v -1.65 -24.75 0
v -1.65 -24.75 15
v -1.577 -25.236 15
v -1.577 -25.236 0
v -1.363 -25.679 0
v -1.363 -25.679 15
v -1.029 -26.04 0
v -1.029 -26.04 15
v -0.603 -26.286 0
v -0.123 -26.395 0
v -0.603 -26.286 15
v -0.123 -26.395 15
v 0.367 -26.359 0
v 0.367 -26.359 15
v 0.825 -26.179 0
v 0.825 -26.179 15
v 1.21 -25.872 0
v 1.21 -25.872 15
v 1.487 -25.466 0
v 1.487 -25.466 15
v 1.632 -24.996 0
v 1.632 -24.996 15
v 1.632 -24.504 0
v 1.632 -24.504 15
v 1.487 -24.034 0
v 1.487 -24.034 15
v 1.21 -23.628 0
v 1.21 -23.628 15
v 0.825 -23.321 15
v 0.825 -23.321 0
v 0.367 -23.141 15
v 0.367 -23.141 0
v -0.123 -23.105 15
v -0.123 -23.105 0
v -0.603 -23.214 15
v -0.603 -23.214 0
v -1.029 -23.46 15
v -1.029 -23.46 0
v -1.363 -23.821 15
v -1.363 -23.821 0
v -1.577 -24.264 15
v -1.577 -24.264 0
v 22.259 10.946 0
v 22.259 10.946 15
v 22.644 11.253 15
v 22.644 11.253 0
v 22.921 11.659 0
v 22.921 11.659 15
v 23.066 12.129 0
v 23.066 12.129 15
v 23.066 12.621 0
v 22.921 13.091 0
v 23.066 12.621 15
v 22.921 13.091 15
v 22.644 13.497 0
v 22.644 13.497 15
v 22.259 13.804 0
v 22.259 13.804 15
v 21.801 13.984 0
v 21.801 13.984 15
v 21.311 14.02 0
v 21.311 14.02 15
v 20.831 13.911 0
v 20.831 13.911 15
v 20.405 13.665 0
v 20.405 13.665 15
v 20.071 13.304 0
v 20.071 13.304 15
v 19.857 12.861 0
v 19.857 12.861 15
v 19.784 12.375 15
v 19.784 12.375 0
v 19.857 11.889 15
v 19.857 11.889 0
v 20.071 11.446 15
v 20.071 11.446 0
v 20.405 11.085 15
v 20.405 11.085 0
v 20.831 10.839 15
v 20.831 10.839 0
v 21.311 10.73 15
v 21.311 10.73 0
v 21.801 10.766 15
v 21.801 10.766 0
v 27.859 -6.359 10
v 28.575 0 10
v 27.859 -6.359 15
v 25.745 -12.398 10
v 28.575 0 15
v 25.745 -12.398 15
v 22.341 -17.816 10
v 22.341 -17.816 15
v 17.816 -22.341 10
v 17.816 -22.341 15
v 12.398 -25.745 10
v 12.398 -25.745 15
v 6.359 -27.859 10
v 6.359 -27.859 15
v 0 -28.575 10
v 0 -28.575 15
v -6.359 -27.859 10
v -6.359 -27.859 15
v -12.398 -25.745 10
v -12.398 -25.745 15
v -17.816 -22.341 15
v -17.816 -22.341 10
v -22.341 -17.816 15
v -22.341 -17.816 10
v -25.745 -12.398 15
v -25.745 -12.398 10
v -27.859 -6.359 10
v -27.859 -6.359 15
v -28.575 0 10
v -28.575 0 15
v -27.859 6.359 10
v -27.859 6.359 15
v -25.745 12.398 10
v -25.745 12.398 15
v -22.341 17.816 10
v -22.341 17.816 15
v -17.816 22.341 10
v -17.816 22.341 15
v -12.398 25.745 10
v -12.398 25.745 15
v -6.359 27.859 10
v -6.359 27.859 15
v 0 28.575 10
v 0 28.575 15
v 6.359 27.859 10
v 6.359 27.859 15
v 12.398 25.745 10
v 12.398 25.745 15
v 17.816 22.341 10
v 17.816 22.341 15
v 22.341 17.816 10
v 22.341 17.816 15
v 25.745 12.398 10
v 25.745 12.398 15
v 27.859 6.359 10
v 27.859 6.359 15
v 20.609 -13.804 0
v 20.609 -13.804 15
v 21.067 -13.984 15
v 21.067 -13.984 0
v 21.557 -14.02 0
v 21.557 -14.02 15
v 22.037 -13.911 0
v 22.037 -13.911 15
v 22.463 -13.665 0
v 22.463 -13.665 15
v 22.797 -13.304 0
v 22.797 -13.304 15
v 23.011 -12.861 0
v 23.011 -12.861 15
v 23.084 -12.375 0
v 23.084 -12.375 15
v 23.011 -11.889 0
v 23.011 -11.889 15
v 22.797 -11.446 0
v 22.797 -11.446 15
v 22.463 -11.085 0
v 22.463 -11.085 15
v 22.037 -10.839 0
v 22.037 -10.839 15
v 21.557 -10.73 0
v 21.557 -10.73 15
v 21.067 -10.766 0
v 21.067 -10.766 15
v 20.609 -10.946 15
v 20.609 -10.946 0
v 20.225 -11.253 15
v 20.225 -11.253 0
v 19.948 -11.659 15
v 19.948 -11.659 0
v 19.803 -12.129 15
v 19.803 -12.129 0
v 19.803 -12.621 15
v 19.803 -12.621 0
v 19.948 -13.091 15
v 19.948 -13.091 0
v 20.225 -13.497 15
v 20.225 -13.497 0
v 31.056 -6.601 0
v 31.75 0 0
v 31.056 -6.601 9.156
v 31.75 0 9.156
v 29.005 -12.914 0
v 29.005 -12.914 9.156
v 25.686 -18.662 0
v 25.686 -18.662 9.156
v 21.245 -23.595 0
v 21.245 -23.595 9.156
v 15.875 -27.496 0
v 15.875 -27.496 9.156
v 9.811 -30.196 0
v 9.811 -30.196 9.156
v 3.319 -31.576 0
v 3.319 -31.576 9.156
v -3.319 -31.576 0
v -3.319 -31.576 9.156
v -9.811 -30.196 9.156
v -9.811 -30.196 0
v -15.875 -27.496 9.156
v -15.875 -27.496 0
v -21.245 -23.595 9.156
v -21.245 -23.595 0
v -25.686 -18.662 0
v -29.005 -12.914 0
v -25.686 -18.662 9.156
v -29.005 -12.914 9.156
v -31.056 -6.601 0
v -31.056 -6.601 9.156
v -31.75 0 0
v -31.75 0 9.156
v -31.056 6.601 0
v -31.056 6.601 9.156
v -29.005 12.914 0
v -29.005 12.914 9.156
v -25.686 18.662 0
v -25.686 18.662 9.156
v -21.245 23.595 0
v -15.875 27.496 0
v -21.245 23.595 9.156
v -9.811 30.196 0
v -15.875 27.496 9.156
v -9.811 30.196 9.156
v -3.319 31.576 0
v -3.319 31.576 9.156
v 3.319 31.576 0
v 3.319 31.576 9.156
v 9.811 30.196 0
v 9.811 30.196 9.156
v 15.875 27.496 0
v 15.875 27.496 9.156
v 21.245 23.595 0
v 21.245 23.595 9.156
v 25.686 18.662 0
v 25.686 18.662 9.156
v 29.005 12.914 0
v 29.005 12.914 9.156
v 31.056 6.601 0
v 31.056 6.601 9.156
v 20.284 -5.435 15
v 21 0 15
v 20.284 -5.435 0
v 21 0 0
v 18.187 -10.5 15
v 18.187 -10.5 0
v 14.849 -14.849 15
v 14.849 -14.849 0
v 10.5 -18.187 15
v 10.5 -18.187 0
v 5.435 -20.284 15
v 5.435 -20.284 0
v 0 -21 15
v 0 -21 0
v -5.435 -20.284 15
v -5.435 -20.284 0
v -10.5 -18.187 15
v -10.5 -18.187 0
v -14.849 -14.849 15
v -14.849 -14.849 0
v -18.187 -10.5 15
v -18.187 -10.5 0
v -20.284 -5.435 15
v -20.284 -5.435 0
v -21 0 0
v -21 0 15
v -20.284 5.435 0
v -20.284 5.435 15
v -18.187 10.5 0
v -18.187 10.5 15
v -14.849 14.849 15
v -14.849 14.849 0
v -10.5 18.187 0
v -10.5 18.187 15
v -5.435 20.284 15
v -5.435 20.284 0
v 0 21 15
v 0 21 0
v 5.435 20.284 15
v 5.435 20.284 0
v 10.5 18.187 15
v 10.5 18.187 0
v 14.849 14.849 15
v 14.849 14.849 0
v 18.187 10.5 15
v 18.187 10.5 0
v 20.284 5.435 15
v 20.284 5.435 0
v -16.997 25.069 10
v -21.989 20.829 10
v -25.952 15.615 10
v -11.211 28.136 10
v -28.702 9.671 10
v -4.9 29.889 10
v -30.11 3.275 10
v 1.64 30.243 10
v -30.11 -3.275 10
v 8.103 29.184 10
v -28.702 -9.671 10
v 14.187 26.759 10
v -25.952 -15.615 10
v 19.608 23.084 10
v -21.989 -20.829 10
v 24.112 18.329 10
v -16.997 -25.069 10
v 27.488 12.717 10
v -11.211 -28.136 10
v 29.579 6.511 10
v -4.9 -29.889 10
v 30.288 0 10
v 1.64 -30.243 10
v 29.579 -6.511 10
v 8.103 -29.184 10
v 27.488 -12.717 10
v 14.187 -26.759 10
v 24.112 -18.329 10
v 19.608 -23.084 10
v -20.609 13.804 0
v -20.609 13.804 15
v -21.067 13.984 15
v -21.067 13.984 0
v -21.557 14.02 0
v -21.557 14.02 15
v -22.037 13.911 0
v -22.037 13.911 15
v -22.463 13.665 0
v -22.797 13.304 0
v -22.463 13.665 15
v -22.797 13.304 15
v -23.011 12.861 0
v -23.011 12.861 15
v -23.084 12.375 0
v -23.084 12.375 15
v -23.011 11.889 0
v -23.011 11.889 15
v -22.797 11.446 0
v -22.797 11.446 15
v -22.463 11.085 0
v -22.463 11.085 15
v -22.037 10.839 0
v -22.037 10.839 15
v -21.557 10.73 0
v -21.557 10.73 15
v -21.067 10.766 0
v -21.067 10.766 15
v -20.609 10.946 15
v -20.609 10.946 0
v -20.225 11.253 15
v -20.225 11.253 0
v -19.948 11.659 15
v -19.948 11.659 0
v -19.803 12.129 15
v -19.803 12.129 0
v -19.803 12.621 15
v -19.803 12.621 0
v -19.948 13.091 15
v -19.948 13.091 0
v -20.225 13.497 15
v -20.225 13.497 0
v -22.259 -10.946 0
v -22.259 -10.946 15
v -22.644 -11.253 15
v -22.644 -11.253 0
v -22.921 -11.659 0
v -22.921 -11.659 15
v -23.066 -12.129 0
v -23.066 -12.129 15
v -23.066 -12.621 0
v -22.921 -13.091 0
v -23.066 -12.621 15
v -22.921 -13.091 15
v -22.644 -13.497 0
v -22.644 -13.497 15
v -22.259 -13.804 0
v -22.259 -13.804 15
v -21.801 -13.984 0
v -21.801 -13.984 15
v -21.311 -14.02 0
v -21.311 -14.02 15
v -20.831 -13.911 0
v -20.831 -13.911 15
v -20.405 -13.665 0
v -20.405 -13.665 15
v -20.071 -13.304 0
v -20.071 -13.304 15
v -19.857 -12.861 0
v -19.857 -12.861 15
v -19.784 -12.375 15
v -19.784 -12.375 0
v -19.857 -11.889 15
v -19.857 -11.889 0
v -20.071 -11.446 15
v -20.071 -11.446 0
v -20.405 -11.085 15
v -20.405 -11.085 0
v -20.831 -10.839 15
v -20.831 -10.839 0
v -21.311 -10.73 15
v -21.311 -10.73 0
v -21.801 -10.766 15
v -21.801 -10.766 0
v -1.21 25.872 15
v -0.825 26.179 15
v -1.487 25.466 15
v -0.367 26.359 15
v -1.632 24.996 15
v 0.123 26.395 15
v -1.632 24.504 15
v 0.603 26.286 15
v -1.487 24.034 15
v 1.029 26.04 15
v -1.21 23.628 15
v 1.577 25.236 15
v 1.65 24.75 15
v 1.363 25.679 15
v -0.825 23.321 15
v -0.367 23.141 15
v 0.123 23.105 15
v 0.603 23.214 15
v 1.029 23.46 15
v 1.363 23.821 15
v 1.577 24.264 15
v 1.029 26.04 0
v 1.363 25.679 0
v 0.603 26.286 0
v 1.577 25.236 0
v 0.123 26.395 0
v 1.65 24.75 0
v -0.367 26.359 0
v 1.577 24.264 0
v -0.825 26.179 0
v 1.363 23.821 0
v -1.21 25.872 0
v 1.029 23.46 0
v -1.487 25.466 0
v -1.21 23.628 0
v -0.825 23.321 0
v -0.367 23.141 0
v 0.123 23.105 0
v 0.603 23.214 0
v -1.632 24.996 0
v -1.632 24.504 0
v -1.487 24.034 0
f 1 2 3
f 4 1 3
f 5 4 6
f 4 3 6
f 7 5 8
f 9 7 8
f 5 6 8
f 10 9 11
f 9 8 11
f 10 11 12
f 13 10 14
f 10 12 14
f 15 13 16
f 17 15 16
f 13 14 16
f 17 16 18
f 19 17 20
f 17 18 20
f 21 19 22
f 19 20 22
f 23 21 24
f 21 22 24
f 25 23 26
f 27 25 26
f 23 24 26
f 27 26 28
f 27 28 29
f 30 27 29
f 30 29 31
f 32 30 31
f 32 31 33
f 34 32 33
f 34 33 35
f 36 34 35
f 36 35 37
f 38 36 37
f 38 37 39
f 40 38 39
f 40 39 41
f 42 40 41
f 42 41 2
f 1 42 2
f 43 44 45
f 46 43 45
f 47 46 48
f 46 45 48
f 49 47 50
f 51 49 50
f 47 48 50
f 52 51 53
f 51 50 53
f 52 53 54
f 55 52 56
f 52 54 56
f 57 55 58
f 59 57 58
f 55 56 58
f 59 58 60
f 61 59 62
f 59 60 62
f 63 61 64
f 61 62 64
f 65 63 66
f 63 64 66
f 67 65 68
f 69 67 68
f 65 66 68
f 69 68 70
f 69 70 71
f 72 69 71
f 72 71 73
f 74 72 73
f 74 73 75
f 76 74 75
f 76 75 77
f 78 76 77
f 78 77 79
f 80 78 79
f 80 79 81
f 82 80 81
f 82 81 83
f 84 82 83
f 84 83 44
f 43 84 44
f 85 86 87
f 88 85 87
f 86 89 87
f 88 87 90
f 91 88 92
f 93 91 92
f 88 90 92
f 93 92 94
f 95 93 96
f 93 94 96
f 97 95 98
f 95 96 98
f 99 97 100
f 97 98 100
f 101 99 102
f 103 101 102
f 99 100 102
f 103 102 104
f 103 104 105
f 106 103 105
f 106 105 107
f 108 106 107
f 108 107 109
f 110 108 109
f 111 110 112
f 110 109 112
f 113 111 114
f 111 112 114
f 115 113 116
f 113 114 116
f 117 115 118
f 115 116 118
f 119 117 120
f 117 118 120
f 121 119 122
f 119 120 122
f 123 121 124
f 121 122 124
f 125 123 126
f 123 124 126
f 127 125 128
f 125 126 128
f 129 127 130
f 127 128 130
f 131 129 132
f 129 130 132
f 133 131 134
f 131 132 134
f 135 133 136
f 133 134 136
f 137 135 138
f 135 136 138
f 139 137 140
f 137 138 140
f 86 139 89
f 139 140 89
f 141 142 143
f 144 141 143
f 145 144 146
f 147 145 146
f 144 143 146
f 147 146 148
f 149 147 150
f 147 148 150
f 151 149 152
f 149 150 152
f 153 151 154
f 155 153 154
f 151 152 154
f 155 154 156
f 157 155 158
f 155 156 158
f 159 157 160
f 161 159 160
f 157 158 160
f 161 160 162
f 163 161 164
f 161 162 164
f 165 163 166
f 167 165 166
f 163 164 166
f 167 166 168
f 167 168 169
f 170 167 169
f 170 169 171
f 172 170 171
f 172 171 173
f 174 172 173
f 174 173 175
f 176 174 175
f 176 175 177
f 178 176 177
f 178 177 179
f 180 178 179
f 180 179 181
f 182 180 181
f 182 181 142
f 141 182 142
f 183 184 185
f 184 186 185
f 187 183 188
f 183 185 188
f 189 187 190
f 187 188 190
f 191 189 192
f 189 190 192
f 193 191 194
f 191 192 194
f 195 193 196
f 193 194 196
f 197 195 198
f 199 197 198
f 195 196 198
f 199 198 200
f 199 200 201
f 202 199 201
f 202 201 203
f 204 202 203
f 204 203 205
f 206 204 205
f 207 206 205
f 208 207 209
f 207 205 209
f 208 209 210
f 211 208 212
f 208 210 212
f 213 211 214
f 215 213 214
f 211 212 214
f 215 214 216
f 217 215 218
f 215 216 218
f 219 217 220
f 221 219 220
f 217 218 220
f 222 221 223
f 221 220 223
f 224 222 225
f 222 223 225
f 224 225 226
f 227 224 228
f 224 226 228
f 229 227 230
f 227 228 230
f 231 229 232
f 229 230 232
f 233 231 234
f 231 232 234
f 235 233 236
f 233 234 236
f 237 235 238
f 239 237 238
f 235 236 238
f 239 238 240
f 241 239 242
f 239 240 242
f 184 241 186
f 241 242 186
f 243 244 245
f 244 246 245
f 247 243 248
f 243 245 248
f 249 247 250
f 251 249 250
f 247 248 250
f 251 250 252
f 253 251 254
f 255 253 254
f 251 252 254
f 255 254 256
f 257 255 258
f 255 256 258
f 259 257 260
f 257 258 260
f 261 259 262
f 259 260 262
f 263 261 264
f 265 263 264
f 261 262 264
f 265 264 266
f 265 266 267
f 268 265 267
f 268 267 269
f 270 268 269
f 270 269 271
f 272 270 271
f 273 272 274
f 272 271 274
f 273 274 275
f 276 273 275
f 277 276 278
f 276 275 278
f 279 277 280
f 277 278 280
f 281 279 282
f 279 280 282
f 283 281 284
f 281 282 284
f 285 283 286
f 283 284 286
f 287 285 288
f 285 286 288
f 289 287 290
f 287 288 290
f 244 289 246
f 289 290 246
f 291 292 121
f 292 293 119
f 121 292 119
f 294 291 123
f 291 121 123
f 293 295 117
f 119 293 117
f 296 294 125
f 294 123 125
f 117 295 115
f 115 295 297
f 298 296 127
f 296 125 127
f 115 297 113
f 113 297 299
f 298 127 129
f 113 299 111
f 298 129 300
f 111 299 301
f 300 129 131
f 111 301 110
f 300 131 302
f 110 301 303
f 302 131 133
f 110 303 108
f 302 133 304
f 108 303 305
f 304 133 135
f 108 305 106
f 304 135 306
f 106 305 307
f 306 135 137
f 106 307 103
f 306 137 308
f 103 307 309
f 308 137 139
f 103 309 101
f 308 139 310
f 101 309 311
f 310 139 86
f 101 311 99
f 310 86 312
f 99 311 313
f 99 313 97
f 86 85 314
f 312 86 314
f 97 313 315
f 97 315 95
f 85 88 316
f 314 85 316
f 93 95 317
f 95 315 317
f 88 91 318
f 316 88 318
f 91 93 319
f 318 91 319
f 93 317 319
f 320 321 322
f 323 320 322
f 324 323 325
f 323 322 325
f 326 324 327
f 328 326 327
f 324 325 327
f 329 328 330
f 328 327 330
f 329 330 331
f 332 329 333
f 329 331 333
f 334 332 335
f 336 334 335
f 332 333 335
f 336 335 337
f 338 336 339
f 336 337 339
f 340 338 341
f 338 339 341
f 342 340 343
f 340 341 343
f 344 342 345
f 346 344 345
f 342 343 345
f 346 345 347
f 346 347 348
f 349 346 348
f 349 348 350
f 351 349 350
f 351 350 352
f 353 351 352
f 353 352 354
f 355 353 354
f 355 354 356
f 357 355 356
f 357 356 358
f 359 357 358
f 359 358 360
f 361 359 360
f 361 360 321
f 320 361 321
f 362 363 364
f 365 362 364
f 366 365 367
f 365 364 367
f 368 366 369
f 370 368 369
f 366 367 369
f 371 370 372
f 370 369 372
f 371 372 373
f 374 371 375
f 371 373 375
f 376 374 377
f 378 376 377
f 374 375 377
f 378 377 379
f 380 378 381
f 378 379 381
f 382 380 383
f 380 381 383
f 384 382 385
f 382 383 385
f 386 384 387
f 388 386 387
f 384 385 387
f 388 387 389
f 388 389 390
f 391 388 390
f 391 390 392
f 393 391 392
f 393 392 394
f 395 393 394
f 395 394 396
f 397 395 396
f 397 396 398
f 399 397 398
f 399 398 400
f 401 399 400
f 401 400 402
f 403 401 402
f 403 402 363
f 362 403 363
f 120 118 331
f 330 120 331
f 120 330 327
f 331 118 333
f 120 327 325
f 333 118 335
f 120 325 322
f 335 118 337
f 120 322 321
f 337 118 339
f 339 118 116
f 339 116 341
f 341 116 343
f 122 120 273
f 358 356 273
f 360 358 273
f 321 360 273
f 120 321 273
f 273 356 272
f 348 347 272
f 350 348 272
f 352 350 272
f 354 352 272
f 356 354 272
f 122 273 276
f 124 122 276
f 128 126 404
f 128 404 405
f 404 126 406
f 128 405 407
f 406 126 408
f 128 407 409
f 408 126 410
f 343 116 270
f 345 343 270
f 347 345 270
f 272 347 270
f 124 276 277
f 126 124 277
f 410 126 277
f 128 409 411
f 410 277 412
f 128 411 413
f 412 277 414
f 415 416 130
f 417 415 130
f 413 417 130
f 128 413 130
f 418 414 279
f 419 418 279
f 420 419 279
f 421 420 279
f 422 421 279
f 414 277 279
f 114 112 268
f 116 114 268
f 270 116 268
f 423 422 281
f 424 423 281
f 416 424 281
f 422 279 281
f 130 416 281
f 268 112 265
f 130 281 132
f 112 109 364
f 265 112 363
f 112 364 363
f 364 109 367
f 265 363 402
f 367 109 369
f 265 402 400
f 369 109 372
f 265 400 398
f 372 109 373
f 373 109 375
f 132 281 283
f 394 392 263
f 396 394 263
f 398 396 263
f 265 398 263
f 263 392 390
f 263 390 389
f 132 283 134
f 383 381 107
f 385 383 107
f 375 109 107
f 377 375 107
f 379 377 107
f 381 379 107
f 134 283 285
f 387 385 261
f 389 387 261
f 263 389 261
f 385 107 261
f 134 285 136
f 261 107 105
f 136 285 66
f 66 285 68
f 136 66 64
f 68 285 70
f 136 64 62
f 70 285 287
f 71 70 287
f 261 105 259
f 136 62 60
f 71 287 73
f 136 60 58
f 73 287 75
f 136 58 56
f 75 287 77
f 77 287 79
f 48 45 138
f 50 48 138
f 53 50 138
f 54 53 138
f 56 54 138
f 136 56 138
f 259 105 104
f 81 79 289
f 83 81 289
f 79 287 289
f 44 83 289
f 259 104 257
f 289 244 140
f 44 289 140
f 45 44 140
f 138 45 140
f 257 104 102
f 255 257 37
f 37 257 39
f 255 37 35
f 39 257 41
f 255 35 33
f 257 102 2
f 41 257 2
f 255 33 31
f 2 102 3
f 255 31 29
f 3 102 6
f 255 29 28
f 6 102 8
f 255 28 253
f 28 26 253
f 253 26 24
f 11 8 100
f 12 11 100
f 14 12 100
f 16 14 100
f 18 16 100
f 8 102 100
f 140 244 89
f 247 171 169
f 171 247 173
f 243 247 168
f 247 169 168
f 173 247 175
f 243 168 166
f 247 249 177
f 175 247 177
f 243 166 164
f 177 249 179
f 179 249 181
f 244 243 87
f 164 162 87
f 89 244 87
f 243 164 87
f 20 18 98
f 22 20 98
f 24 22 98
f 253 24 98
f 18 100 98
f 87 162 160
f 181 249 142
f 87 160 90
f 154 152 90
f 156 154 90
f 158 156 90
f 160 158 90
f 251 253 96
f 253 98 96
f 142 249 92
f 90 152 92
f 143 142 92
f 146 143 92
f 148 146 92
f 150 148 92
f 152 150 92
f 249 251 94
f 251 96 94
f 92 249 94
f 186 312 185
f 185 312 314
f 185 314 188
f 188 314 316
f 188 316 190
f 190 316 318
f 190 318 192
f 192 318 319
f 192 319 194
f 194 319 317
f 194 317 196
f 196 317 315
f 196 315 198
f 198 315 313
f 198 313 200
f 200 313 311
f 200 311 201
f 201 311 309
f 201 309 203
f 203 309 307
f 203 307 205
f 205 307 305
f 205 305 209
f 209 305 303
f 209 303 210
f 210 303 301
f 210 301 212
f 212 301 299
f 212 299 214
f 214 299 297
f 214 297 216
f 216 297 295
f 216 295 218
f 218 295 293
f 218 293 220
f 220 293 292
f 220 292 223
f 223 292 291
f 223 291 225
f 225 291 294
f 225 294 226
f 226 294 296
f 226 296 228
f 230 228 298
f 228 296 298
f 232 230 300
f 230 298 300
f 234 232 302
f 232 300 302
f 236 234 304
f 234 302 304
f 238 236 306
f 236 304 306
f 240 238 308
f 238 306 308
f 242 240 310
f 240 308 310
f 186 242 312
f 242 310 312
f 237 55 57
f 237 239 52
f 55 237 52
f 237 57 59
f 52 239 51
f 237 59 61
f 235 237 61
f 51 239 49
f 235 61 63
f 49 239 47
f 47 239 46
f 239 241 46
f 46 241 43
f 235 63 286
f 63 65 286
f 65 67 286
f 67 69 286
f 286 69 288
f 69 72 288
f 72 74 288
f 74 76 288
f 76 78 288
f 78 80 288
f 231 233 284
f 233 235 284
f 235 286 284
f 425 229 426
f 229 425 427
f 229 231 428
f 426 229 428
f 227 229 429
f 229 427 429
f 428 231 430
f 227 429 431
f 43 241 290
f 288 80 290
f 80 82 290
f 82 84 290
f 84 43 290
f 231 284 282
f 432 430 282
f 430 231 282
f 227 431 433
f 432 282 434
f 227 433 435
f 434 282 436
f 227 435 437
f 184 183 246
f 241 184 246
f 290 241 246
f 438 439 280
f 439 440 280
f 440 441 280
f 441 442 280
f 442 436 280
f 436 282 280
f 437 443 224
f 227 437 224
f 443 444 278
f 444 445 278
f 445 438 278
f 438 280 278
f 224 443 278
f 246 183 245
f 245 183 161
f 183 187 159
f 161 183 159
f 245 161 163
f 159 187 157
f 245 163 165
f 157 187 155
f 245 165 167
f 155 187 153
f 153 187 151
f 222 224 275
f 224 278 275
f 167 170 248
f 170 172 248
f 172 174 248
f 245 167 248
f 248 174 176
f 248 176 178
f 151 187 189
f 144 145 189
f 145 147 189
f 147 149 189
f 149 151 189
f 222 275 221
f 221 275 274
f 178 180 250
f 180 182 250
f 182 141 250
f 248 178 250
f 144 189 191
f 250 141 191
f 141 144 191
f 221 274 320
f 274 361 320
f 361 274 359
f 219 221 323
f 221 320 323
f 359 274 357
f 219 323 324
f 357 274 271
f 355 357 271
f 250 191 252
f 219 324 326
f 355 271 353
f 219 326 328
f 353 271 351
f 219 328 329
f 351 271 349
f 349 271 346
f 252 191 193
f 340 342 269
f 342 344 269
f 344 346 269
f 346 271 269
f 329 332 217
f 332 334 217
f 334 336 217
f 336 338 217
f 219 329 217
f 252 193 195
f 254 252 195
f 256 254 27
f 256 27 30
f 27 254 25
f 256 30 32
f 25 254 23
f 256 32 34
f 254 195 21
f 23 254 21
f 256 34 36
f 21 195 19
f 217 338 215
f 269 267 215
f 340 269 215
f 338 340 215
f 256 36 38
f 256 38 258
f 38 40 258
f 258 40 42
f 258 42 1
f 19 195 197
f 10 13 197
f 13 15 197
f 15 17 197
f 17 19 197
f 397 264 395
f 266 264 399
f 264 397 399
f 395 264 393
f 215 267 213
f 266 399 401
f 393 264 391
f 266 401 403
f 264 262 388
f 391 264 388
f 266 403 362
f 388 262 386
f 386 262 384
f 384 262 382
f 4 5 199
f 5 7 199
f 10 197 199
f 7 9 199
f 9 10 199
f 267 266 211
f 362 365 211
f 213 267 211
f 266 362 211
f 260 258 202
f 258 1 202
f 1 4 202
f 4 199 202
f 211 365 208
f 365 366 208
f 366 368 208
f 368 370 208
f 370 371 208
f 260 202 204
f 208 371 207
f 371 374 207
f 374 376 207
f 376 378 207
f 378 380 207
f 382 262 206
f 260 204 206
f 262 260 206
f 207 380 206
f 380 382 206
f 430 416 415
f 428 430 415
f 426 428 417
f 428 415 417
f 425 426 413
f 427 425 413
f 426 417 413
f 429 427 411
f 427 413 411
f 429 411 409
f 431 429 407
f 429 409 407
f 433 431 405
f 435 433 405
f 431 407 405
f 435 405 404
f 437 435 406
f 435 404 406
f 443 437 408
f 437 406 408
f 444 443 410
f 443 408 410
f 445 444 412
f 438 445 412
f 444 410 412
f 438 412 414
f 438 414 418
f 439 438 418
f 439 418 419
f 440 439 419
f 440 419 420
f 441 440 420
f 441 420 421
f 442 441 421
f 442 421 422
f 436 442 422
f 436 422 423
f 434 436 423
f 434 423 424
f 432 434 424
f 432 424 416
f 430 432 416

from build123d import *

# Parameters (mm, degrees)
M4X0_7_TAPPED_HOLE1_D = 3.3
CIRPATTERN1_COUNT     = 6


with BuildPart() as part:
    # Sketch1 → Revolve1 (revolve)
    with BuildSketch(Plane(origin=(0, 0, 0), x_dir=(0, 0, -1), z_dir=(1, 0, 0)), mode=Mode.PRIVATE) as revolve1_sk:
        Polygon((0, 31.75), (-9.155682966, 31.75), (-10, 30.2876), (-10, 28.575), (-15, 28.575), (-15, 21), (0, 21), align=None)
    revolve(revolve1_sk.sketch.rotate(Axis((0, 0, 15), (0, 0, -1)), 90), axis=Axis((0, 0, 15), (0, 0, -1)))

    # M4x0.7 Tapped Hole1 (through all)
    with Locations(Plane(origin=(0, 0, 0), x_dir=(-1, 0, 0), z_dir=(0, 0, -1))):
        with Locations((0, 24.75)):
            m4x0_7_tapped_hole1 = Hole(M4X0_7_TAPPED_HOLE1_D / 2)

    # CirPattern1: M4x0.7 Tapped Hole1 ×6 about axis
    cirpattern1_axis = Axis((0, 0, 0), (0, 0, 1))
    for i in range(1, CIRPATTERN1_COUNT):
        add(m4x0_7_tapped_hole1.rotate(cirpattern1_axis, i * 360 / CIRPATTERN1_COUNT), mode=Mode.SUBTRACT)


solid = part.part
